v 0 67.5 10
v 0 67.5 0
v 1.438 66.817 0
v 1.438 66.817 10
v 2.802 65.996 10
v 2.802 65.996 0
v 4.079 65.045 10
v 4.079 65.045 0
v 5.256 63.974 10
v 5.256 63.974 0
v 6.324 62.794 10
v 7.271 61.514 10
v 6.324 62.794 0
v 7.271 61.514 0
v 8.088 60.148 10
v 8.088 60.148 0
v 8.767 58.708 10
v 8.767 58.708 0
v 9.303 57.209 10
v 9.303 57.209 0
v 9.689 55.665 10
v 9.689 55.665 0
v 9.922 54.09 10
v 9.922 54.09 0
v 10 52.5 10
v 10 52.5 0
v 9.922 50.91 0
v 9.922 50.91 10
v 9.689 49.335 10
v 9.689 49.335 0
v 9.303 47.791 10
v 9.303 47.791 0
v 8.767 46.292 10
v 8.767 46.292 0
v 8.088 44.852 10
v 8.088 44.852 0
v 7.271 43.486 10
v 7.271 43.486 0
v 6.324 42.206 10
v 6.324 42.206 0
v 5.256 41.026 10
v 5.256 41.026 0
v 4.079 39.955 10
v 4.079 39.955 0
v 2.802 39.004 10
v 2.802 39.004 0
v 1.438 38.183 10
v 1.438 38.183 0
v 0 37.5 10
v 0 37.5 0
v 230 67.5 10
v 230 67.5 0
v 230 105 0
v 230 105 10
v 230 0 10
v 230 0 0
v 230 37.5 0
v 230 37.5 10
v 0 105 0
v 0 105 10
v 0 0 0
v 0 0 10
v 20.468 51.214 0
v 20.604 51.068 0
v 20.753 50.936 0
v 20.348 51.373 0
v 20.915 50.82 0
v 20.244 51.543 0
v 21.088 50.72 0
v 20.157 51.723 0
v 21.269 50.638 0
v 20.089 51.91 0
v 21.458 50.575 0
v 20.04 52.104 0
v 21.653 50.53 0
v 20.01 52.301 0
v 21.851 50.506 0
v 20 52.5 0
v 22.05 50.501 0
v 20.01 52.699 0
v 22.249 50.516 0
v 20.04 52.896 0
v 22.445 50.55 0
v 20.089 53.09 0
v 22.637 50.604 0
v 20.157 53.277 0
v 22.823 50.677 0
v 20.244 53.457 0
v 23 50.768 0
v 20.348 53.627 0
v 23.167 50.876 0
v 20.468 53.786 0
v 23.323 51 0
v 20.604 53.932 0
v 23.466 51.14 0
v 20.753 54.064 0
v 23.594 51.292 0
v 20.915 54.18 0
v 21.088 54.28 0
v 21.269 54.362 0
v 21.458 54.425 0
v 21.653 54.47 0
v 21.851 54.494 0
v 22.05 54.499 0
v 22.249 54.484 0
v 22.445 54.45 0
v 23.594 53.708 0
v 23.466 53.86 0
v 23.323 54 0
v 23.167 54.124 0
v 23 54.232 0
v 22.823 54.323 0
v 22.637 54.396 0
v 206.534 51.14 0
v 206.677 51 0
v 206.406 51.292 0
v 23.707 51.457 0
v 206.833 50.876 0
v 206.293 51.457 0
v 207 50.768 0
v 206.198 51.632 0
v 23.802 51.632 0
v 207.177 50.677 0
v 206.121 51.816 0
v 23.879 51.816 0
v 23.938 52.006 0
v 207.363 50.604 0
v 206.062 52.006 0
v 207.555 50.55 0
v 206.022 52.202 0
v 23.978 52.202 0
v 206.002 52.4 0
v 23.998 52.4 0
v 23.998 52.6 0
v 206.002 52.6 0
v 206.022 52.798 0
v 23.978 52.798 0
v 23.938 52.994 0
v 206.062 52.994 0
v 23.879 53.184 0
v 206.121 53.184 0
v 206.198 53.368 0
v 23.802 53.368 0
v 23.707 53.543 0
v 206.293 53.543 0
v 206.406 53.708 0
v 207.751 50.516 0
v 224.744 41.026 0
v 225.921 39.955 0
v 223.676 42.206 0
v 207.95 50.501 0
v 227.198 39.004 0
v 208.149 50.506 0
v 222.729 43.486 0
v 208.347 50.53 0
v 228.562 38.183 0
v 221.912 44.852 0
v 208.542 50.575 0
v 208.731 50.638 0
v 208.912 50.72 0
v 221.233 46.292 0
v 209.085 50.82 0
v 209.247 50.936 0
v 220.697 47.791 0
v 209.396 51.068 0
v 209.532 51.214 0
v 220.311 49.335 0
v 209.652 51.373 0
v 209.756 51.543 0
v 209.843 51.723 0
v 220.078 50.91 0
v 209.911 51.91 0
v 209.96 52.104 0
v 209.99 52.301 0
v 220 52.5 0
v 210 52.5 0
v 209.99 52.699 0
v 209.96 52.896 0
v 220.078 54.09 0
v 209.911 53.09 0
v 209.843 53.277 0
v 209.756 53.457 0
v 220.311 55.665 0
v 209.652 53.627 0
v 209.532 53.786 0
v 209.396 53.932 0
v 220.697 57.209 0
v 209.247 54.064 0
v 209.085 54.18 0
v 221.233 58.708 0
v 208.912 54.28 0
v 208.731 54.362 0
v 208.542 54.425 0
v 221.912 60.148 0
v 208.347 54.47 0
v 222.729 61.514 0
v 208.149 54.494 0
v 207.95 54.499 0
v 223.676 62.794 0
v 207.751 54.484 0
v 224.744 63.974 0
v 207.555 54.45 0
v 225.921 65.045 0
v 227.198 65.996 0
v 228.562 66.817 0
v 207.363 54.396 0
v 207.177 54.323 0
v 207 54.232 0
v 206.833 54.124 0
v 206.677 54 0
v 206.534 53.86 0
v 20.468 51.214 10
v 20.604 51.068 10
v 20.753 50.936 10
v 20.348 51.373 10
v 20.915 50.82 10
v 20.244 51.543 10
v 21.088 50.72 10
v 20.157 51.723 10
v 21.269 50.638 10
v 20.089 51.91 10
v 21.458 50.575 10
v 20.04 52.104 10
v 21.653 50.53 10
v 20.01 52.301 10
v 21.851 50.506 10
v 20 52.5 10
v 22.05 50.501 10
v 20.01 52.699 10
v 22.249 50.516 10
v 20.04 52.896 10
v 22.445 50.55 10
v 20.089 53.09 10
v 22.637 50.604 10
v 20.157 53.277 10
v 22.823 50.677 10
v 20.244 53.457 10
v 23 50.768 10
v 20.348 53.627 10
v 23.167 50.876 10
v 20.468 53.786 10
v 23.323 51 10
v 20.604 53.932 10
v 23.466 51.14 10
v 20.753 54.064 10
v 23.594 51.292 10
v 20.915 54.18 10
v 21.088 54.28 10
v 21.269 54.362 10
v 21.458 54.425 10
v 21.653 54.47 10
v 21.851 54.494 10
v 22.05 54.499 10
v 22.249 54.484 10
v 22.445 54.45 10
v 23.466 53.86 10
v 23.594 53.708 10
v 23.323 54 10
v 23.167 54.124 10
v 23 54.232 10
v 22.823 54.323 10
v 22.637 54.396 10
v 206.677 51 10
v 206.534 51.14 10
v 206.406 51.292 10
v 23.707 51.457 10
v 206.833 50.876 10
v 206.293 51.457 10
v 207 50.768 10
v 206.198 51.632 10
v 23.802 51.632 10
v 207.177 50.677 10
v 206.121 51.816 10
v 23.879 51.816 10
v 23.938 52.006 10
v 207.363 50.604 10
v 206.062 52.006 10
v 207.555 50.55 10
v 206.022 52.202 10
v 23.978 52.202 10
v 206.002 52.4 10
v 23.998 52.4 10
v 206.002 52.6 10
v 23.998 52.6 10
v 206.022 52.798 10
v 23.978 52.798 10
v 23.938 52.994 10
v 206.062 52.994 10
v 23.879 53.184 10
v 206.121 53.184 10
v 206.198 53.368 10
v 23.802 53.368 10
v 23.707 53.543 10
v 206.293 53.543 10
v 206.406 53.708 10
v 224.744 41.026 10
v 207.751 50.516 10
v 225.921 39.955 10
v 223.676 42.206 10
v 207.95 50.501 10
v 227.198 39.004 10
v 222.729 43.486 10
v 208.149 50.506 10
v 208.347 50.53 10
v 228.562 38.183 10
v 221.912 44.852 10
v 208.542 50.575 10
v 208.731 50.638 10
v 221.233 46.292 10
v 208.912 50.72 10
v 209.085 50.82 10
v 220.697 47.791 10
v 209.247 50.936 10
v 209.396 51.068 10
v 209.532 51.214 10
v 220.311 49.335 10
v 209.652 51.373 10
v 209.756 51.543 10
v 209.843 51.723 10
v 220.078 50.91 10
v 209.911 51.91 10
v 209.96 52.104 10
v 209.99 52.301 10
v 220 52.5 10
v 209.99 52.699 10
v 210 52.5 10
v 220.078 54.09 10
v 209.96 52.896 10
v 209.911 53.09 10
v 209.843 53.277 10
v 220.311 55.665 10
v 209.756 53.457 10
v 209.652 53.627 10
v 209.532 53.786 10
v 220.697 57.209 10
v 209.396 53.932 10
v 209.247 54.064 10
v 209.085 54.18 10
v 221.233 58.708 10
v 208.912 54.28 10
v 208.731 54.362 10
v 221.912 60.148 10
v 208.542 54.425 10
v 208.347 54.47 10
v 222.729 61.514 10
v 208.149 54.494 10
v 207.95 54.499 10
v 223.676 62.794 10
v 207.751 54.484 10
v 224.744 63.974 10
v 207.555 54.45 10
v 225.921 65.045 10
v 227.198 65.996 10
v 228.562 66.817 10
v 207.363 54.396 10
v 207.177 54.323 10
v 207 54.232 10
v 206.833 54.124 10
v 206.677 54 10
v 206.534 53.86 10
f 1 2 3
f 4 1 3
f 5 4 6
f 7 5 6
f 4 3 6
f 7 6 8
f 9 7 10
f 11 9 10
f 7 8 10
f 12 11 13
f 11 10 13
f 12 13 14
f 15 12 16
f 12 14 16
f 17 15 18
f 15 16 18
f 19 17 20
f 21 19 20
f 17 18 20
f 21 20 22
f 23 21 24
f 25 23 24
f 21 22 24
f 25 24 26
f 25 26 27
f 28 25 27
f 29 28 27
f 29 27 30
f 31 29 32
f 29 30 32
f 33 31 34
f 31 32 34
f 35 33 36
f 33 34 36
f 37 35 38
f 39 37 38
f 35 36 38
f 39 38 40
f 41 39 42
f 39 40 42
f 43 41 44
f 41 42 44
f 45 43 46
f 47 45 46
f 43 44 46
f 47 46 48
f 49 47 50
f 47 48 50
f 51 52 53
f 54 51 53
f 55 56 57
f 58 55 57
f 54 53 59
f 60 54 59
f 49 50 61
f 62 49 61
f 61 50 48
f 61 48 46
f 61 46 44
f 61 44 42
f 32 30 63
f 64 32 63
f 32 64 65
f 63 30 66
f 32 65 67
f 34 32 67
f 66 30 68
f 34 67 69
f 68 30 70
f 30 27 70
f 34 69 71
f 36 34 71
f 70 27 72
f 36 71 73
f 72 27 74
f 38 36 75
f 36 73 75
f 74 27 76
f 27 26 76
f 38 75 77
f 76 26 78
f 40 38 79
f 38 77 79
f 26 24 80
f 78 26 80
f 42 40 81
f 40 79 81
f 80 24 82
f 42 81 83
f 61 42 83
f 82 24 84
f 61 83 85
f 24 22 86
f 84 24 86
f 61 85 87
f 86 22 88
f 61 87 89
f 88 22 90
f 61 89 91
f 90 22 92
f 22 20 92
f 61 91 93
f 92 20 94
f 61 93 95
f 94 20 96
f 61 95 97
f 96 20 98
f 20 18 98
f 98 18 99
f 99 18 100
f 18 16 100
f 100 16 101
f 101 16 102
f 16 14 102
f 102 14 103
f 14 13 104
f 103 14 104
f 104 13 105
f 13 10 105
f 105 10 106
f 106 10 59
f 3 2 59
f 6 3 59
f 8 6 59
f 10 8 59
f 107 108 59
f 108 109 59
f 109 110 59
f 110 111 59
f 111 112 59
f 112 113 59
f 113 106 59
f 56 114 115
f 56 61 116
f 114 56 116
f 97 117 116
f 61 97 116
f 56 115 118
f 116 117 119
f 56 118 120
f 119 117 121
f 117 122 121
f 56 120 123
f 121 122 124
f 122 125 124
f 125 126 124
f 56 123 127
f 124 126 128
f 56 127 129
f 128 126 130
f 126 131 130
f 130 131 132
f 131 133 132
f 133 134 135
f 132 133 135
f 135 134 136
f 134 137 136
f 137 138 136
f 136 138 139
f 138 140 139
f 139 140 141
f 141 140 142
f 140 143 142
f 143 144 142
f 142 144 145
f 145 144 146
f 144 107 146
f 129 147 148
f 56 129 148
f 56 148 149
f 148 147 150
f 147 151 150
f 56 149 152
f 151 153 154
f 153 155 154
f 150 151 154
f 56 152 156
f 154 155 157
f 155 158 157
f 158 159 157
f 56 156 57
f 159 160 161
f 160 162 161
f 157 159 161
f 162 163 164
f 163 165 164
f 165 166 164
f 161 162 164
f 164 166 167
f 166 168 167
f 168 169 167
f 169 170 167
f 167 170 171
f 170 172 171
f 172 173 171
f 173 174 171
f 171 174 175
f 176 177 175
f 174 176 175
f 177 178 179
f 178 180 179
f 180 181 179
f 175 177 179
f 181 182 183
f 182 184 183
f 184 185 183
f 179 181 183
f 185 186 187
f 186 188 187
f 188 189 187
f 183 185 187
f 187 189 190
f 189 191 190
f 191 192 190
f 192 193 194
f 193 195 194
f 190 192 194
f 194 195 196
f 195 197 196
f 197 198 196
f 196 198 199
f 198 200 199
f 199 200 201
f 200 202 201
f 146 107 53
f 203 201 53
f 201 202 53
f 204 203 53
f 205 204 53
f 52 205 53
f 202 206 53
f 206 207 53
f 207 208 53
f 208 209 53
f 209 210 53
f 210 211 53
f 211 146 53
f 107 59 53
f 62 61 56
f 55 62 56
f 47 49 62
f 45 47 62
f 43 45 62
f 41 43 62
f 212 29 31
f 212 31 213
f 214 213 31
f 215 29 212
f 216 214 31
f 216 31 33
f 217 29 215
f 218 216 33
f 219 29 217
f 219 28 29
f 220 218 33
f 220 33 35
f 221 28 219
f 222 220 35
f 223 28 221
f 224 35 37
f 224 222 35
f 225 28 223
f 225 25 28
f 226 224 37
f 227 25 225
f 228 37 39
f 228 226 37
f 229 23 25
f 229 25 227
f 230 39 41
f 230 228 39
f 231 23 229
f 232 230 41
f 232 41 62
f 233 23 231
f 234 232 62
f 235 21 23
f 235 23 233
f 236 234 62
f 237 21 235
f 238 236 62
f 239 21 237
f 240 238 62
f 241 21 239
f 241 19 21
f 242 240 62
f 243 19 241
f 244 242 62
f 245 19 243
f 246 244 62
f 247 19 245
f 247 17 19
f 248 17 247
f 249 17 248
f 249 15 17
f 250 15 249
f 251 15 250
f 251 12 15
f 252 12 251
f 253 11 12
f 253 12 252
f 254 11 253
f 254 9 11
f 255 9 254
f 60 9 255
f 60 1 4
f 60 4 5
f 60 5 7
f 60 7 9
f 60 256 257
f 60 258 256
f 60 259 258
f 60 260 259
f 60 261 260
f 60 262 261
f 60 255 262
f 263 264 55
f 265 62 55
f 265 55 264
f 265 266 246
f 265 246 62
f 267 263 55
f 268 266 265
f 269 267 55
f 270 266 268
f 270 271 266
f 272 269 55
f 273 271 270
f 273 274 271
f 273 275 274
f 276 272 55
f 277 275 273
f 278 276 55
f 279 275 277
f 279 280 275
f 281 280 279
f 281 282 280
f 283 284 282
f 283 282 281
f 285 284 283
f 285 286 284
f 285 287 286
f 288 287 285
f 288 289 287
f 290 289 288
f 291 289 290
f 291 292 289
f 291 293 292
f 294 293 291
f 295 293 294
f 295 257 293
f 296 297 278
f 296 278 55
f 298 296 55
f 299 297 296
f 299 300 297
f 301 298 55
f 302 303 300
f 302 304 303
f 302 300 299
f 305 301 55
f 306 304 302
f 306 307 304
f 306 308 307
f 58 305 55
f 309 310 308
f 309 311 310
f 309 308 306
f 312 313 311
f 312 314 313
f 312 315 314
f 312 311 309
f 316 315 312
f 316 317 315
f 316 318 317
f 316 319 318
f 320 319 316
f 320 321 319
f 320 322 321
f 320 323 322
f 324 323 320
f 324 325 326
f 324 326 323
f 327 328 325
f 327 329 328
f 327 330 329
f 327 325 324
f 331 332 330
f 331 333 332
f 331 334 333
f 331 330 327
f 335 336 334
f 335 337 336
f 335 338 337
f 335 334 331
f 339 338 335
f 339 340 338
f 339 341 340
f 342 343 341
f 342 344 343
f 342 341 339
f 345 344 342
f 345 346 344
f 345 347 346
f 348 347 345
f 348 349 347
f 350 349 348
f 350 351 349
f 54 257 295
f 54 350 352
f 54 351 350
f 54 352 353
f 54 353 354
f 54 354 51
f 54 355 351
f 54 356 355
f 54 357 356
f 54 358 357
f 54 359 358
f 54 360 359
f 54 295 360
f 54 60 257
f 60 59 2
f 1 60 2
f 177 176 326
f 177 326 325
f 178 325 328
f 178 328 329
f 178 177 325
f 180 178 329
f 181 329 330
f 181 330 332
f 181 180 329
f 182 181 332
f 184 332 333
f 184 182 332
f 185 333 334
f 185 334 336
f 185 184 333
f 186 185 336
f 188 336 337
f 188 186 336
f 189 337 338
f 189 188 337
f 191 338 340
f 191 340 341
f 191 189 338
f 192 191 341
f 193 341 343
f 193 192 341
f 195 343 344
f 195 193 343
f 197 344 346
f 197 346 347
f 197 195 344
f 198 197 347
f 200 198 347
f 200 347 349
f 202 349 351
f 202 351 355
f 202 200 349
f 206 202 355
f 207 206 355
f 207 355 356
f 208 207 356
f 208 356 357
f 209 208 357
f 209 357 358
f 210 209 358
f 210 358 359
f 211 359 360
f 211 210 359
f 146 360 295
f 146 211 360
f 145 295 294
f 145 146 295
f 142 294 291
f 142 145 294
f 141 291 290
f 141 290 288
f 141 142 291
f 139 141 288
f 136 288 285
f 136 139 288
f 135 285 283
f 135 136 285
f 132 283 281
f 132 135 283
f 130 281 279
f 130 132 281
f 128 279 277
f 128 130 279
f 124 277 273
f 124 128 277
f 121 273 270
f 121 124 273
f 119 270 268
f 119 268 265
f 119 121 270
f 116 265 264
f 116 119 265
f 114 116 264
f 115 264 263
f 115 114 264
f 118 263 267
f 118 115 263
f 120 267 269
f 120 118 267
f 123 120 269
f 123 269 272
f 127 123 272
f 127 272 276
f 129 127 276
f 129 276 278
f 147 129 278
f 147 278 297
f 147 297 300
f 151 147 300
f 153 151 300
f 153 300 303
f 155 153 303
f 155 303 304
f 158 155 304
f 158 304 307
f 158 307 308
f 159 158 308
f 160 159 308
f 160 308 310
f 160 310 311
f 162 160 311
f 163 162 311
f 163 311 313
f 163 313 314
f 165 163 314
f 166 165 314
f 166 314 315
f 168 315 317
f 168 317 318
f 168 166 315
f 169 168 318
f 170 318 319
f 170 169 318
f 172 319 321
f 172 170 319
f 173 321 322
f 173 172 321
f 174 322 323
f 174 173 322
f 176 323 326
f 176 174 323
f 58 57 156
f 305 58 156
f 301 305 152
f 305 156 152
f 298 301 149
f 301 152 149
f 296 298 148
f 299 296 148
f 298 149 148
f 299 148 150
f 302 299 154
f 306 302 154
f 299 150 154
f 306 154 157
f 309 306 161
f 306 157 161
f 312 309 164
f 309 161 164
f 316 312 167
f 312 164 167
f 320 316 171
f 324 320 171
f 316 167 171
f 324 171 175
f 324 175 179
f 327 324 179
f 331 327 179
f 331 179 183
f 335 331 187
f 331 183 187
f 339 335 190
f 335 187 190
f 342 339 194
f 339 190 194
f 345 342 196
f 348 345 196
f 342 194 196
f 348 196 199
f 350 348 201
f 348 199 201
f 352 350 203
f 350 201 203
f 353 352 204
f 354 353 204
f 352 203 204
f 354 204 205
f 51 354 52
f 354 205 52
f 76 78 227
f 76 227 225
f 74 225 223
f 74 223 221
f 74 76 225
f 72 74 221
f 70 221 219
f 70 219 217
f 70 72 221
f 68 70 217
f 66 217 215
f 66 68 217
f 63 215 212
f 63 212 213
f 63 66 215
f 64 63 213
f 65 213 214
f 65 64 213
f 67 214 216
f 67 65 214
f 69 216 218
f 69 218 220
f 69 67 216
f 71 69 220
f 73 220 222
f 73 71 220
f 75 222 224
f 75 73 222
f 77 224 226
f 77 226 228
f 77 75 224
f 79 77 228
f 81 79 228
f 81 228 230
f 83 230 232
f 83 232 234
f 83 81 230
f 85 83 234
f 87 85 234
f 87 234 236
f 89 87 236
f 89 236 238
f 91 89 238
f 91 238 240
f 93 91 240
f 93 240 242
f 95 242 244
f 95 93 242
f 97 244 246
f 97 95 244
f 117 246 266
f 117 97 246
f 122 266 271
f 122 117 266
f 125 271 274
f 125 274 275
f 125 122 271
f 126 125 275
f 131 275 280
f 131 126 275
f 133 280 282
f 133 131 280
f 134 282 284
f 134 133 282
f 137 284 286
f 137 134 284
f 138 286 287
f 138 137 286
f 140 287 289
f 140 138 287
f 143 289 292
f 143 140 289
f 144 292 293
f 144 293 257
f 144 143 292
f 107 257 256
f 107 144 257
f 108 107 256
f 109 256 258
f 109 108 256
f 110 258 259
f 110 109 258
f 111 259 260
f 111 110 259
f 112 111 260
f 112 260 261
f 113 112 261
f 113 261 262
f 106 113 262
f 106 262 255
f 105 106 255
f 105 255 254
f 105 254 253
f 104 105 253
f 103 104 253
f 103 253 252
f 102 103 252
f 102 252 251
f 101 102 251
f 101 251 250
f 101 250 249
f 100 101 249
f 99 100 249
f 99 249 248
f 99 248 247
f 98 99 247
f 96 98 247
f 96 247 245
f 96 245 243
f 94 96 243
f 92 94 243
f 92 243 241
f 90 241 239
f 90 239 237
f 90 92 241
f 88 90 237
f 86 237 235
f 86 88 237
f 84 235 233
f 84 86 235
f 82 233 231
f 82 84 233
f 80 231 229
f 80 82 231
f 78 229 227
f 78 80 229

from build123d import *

# Parameters (mm, degrees)
SKETCH1_R           = 2
BOSS_EXTRUDE1_DEPTH = 10


with BuildPart() as part:
    # Sketch1 → Boss-Extrude1 (new body)
    with BuildSketch(Plane.XY):
        with BuildLine():
            Line((0, 0), (230, 0))
            Line((230, 0), (230, 37.5))
            ThreePointArc((230, 37.5), (220, 52.5), (230, 67.5))
            Line((230, 67.5), (230, 105))
            Line((230, 105), (0, 105))
            Line((0, 105), (0, 67.5))
            ThreePointArc((0, 67.5), (10, 52.5), (0, 37.5))
            Line((0, 37.5), (0, 0))
        make_face()
        with Locations((208, 52.5)):
            Circle(SKETCH1_R, mode=Mode.SUBTRACT)
        with Locations(Location((22, 52.5, 0), (0, 0, 180))):
            Circle(SKETCH1_R, mode=Mode.SUBTRACT)
    extrude(amount=BOSS_EXTRUDE1_DEPTH)


solid = part.part
